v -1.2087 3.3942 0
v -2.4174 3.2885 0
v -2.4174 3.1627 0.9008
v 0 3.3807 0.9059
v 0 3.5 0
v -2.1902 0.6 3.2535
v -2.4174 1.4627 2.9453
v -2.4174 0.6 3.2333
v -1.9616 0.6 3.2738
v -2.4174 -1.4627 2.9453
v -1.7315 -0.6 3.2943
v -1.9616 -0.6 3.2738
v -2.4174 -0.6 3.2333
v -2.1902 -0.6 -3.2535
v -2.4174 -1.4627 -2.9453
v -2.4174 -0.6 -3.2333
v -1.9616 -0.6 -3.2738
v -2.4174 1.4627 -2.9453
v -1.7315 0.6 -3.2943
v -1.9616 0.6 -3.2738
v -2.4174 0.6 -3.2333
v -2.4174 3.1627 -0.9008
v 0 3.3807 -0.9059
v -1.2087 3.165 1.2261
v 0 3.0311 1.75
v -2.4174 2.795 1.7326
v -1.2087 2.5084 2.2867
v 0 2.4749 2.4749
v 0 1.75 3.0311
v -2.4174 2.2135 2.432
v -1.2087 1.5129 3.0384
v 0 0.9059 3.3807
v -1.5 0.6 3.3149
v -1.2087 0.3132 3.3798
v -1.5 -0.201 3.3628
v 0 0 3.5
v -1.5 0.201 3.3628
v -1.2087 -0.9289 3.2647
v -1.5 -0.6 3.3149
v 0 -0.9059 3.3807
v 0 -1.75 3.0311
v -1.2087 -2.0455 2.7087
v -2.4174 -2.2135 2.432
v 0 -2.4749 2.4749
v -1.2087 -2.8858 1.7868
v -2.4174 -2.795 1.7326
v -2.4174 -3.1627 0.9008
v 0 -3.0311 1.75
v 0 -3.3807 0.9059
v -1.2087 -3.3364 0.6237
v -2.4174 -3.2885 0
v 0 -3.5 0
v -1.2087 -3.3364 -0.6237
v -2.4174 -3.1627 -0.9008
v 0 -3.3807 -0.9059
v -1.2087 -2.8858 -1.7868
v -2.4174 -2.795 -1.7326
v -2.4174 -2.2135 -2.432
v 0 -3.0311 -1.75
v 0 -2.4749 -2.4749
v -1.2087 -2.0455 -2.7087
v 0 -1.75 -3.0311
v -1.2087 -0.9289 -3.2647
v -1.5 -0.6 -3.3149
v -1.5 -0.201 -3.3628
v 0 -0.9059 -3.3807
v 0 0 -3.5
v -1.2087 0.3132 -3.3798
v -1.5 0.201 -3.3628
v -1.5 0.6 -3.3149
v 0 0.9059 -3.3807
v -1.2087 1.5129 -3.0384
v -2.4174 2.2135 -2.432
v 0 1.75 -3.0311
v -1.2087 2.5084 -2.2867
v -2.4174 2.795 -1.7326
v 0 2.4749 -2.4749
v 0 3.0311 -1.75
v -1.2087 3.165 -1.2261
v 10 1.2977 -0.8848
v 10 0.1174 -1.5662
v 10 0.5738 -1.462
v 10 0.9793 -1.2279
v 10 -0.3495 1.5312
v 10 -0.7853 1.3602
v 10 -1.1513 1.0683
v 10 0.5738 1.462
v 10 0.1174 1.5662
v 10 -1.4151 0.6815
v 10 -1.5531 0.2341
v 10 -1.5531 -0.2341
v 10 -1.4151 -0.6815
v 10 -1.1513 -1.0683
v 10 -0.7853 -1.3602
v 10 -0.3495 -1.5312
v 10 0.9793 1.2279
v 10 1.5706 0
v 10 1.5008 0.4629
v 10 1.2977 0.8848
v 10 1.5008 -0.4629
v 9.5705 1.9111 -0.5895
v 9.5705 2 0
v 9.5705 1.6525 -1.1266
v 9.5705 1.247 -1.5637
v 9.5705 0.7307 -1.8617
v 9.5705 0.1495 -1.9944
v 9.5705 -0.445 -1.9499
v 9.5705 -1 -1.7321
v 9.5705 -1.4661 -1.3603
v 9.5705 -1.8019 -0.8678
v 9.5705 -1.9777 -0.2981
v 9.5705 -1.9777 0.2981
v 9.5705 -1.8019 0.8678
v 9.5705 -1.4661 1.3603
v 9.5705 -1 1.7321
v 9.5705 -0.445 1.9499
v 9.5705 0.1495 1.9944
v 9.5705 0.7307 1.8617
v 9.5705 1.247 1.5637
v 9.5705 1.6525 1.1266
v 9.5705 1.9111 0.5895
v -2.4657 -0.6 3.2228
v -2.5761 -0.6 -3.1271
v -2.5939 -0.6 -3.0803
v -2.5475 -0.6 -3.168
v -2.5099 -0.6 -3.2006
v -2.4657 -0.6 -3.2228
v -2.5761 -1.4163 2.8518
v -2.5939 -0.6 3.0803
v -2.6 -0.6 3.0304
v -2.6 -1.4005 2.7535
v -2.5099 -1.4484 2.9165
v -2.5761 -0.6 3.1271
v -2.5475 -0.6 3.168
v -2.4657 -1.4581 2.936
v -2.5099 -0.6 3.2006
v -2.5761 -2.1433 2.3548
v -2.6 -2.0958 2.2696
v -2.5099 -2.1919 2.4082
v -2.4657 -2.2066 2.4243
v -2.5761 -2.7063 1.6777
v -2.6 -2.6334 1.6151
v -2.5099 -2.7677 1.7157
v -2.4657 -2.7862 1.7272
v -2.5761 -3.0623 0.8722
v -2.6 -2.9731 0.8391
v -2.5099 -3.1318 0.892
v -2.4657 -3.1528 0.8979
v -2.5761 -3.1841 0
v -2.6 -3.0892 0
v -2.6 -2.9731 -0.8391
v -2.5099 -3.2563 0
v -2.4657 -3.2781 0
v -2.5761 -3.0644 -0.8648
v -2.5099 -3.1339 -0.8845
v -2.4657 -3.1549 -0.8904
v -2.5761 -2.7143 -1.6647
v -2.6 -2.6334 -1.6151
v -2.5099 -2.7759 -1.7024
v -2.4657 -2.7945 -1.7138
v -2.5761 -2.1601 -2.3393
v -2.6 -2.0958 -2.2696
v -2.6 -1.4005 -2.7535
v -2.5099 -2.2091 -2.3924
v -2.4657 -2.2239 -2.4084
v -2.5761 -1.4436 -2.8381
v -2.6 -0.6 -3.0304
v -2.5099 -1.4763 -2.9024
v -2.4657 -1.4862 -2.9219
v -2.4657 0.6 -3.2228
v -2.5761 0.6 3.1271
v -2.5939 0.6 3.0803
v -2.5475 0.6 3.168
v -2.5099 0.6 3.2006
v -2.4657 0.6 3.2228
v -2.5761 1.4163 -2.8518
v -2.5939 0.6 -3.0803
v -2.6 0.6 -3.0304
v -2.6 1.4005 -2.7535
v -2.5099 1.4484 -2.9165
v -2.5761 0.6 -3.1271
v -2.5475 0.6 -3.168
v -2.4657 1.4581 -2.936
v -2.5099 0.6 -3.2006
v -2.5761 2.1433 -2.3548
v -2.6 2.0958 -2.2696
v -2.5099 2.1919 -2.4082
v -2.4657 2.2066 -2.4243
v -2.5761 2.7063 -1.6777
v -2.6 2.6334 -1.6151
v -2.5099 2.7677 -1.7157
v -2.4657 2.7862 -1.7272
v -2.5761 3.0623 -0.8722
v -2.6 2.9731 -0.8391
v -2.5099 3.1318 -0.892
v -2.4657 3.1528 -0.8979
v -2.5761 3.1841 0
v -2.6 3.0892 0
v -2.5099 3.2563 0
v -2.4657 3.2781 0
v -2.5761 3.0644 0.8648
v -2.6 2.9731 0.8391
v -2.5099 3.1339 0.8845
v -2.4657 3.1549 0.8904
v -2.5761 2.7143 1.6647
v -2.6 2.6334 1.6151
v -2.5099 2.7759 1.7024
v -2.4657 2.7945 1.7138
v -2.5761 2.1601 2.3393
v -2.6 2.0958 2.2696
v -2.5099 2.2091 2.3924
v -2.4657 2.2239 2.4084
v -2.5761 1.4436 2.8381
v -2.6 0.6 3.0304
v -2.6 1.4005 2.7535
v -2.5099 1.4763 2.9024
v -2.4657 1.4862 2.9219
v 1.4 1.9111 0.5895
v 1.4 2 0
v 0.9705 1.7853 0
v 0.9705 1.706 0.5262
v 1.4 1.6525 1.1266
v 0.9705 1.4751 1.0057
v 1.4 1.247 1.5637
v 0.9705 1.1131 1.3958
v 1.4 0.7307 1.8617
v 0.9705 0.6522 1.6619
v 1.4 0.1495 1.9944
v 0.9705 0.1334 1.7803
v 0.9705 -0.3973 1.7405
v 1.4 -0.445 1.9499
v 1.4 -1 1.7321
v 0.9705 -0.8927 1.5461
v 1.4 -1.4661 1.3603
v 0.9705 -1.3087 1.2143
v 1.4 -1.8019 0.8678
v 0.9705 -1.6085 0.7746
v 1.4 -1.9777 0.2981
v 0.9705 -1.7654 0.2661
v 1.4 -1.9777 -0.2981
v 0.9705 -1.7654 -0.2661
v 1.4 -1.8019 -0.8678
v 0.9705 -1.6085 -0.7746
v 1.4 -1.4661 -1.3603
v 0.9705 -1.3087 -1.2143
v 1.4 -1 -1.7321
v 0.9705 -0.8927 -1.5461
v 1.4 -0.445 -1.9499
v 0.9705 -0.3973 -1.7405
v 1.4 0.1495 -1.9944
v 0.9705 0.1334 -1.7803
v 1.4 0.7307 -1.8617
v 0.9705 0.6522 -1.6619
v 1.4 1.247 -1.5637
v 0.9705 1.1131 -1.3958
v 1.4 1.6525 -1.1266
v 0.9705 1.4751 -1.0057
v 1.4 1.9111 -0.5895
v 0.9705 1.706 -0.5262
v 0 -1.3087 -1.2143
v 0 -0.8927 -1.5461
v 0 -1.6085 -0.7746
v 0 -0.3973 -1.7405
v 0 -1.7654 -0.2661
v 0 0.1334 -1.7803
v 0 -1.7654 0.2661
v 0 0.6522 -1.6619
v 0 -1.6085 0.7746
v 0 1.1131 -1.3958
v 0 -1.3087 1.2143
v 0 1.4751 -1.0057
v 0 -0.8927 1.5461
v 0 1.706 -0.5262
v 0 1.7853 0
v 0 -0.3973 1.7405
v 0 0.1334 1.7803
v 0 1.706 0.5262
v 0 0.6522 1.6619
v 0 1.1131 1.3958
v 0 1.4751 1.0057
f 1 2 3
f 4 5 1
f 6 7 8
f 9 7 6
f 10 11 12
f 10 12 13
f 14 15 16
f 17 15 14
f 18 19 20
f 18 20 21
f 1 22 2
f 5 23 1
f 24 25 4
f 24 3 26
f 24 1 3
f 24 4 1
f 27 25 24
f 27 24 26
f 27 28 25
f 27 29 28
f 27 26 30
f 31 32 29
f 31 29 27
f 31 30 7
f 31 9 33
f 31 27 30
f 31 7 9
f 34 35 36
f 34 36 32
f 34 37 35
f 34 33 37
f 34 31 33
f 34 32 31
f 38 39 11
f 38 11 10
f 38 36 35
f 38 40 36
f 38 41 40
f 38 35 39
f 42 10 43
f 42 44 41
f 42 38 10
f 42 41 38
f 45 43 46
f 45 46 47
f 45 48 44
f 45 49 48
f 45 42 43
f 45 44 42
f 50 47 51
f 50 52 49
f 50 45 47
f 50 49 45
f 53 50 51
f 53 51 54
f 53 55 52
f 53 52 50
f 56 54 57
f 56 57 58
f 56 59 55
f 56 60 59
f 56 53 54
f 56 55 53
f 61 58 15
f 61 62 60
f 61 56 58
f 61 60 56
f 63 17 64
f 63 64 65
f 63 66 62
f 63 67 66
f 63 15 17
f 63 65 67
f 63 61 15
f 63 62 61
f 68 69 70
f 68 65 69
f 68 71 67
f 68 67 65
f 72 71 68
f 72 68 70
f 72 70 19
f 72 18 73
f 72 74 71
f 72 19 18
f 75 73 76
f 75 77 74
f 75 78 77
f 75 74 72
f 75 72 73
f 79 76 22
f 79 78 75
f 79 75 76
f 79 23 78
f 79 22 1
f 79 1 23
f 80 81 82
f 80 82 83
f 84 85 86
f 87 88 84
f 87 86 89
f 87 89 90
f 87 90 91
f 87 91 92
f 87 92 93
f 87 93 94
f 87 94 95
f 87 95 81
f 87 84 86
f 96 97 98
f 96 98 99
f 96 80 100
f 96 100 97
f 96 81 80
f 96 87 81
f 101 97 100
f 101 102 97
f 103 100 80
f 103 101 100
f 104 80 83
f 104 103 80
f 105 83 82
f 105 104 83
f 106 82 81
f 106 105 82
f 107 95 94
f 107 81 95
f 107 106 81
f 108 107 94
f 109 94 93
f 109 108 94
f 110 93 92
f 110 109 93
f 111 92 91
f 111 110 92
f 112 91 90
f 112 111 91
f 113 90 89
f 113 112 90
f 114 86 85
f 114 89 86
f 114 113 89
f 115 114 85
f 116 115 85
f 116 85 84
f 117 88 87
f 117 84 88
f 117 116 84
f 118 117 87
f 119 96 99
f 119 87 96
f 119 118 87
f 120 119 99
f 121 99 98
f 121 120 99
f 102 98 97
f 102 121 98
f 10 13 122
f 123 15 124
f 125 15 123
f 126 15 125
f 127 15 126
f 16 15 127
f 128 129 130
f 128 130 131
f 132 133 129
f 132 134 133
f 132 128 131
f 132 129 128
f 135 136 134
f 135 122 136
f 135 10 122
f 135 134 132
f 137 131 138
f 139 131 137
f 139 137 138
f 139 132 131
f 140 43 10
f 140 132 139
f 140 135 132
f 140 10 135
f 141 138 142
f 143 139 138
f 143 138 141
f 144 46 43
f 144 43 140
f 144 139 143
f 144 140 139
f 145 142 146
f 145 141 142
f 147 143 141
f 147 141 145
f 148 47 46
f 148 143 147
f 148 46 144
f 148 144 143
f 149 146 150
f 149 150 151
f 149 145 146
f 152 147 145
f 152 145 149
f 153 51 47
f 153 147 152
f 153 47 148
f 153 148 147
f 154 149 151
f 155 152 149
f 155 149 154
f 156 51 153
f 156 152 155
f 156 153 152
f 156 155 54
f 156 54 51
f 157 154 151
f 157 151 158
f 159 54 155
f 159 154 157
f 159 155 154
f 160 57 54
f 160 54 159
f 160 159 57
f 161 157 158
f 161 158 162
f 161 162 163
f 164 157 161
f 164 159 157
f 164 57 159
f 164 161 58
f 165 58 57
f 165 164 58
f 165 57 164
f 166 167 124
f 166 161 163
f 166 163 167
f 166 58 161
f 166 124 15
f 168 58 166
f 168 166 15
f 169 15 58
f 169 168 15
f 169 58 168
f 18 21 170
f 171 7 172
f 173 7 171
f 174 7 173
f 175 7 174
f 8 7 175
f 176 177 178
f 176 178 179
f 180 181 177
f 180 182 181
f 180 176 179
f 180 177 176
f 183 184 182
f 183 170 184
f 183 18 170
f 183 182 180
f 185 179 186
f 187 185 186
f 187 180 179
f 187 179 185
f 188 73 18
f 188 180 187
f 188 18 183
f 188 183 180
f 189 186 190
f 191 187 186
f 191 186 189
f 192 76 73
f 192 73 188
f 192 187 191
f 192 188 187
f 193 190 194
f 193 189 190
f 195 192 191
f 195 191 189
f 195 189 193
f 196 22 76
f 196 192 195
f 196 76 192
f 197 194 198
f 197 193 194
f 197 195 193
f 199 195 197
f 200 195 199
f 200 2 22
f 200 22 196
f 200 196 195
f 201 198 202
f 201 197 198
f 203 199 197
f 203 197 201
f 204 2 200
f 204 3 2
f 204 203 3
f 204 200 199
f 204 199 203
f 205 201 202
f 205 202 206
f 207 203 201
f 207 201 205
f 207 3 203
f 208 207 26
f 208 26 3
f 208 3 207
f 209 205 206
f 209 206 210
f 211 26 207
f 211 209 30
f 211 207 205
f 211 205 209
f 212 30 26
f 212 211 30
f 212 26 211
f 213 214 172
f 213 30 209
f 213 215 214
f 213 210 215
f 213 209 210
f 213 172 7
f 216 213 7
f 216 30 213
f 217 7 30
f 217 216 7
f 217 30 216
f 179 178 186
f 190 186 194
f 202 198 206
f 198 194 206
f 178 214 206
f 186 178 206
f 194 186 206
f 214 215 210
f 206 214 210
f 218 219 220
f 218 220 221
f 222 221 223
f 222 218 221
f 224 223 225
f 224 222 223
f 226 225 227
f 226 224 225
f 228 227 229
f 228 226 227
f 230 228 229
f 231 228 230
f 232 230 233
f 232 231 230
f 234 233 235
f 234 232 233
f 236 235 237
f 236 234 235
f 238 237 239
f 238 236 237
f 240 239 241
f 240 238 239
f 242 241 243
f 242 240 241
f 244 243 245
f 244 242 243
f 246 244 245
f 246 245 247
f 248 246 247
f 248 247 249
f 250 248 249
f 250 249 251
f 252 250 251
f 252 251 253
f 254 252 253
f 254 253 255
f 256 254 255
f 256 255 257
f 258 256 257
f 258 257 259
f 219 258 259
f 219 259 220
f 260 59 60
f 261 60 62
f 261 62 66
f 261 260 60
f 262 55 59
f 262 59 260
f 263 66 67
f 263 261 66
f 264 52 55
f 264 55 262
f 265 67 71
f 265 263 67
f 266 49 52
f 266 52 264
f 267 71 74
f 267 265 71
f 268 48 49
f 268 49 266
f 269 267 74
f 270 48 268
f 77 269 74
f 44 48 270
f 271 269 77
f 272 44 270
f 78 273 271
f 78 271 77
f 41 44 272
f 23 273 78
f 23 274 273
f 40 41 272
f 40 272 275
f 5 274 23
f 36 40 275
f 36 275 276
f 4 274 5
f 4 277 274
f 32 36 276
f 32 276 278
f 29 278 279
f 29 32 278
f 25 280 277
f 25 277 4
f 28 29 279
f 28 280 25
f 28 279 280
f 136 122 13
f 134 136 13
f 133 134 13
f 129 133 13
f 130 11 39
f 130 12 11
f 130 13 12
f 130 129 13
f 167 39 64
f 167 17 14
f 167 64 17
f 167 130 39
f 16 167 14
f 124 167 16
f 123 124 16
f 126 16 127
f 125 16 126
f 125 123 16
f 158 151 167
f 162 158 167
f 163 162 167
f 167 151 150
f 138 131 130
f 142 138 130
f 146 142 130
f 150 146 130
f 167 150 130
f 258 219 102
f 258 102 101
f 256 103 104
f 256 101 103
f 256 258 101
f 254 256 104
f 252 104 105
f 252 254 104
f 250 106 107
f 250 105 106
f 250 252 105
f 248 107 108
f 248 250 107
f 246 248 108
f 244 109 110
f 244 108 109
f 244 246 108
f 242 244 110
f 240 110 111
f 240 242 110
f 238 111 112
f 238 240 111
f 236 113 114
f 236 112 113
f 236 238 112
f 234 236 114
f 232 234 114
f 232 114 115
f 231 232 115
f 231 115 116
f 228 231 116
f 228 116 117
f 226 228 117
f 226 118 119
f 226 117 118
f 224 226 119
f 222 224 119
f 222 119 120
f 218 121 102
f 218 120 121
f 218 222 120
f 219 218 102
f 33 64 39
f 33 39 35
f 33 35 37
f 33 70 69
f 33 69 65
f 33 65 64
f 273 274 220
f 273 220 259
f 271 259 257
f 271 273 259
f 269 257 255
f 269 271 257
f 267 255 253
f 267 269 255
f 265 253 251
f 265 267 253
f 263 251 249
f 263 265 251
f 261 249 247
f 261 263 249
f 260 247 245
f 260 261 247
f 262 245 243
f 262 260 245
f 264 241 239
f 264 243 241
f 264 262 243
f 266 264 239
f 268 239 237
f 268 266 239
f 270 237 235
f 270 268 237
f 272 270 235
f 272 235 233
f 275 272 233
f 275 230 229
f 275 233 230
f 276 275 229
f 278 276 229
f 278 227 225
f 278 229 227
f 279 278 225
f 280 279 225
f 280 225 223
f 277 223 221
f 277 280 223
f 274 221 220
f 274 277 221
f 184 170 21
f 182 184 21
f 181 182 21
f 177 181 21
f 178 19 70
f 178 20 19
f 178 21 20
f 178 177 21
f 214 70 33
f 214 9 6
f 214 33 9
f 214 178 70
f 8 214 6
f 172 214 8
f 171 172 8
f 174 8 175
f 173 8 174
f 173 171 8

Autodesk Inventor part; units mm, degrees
ref_plane "YZ Plane" through (0, 0, 0) normal (1, 0, 0) x (0, 1, 0)
ref_plane "XZ Plane" through (0, 0, 0) normal (0, 1, 0) x (-1, 0, 0)
sketch "Sketch1" plane through (0, 0, 0) normal (0, 0, 1) x (1, 0, 0)
  line L0 (-2.6, 0) -> (10, 0)
  line L1 (10, 0) -> (10, 2)
  line L2 (10, 2) -> (1.4, 2)
  line L3 (1.4, 2) -> (0.9705, 1.7853)
  line L4 (0.9705, 1.7853) -> (0, 1.7853)
  line L5 (0, 1.7853) -> (0, 3.5)
  line L6 (-5.12, 0) -> (12.52, 0) projected
  line L7 (0, -0.7) -> (0, 4.2) projected
  line L8 (-2.6, 0) -> (-2.6, 3.2725)
  line L9 (0, 3.5) -> (-2.6, 3.2725)
  line L10 (1.4, 2) -> (0, 2) construction
  dimension "d0" = 10
  dimension "d1" = 8.6
  dimension "d2" = 0.4295
  dimension "d3" = 2.6
  dimension "d4" = 4
  dimension "d5" = 3.5705
  dimension "d9" = 7
  dimension "d10" = 5
revolve "Body" add sketch "Sketch1" angle 360 about axis through (-2.6, 0, 0) along (1, 0, 0)
sketch "Sketch2" plane through (-2.6, 0, 0) normal (-1, 0, 0) x (0, 0, 1)
  circle A0 centre (0, 0) radius 3.5 projected
  line L0 (0, 0) -> (0, 3.2725) projected
  line L1 (-3.5, 0.6) -> (3.5, 0.6)
  line L2 (3.5, 0.6) -> (3.5, -0.6)
  line L3 (3.5, -0.6) -> (-3.5, -0.6)
  line L4 (-3.5, -0.6) -> (-3.5, 0.6)
  line L5 (-3.5, 0) -> (3.5, 0) construction
  line L6 (0, 0.6) -> (0, -0.6) construction
  dimension "d11" = 1.2
  dimension "d12" = 7
fillet "Fillet1" radius 0.2 1 edges at (-2.6, -3.2725, 0)
extrude "Slot" cut sketch "Sketch2" against normal blind 1.1 contours A0 L3 L1 | L2 L3 A0 | A0 L1 L2 | A0 L4 L1 | L3 L4 A0
thread "Thread" size "M4x0.7" class "6g" standard "ISO Metric profile" length 8.6
chamfer "Chamfer1" distance 0.4294 distance2 0.4295 1 edges at (10, -2, 0) measured on face at (10, -0.6816, 0.4421)
ref_plane "Work Plane1" through (30.1625, 0, 0) normal (0, 0, -1) x (1, 0, 0)
equation "\"d11\" = SBR"
equation "\"d12\" = KOD"
equation "\"d19\" = STI"
equation "\"d14\" = RR"
equation "\"d15\" = GEL"
equation "\"d17\" = -0.5 * SPD + 0.5 * GD"
equation "\"d0\" = NLG"
equation "\"d1\" = GEL"
equation "\"d3\" = KOH"
equation "\"d4\" = GD"
equation "\"d5\" = BDM"
equation "\"d9\" = KOD"
equation "\"d10\" = KEWI"
equation "\"GD\" = NND"
equation "\"NLG\" = 10"
equation "\"GEL\" = 8.6"
equation "\"KOD\" = 7"
equation "\"KOH\" = 2.6"
equation "\"GAL\" = 0.61345 * PTC"
equation "\"SPD\" = NND - 1.2269 * PTC"
equation "\"BDM\" = 3.5705"
equation "\"GUL\" = 0.61345 * PTC"
equation "\"RR\" = 0.2"
equation "\"SBR\" = 1.2"
equation "\"STI\" = 1.1"
equation "\"KEWI\" = 5deg"
equation "\"PTC\" = 0.7"
equation "\"THREADDIA\" = 4"
equation "\"TOA\" = 30deg"
equation "\"NND\" = 4"
equation "\"GD1\" = THREADDIA - 1.2269 * PTC"
properties part number "ISO 1207 - M4 x 10" material "Stainless Steel, 440C"
